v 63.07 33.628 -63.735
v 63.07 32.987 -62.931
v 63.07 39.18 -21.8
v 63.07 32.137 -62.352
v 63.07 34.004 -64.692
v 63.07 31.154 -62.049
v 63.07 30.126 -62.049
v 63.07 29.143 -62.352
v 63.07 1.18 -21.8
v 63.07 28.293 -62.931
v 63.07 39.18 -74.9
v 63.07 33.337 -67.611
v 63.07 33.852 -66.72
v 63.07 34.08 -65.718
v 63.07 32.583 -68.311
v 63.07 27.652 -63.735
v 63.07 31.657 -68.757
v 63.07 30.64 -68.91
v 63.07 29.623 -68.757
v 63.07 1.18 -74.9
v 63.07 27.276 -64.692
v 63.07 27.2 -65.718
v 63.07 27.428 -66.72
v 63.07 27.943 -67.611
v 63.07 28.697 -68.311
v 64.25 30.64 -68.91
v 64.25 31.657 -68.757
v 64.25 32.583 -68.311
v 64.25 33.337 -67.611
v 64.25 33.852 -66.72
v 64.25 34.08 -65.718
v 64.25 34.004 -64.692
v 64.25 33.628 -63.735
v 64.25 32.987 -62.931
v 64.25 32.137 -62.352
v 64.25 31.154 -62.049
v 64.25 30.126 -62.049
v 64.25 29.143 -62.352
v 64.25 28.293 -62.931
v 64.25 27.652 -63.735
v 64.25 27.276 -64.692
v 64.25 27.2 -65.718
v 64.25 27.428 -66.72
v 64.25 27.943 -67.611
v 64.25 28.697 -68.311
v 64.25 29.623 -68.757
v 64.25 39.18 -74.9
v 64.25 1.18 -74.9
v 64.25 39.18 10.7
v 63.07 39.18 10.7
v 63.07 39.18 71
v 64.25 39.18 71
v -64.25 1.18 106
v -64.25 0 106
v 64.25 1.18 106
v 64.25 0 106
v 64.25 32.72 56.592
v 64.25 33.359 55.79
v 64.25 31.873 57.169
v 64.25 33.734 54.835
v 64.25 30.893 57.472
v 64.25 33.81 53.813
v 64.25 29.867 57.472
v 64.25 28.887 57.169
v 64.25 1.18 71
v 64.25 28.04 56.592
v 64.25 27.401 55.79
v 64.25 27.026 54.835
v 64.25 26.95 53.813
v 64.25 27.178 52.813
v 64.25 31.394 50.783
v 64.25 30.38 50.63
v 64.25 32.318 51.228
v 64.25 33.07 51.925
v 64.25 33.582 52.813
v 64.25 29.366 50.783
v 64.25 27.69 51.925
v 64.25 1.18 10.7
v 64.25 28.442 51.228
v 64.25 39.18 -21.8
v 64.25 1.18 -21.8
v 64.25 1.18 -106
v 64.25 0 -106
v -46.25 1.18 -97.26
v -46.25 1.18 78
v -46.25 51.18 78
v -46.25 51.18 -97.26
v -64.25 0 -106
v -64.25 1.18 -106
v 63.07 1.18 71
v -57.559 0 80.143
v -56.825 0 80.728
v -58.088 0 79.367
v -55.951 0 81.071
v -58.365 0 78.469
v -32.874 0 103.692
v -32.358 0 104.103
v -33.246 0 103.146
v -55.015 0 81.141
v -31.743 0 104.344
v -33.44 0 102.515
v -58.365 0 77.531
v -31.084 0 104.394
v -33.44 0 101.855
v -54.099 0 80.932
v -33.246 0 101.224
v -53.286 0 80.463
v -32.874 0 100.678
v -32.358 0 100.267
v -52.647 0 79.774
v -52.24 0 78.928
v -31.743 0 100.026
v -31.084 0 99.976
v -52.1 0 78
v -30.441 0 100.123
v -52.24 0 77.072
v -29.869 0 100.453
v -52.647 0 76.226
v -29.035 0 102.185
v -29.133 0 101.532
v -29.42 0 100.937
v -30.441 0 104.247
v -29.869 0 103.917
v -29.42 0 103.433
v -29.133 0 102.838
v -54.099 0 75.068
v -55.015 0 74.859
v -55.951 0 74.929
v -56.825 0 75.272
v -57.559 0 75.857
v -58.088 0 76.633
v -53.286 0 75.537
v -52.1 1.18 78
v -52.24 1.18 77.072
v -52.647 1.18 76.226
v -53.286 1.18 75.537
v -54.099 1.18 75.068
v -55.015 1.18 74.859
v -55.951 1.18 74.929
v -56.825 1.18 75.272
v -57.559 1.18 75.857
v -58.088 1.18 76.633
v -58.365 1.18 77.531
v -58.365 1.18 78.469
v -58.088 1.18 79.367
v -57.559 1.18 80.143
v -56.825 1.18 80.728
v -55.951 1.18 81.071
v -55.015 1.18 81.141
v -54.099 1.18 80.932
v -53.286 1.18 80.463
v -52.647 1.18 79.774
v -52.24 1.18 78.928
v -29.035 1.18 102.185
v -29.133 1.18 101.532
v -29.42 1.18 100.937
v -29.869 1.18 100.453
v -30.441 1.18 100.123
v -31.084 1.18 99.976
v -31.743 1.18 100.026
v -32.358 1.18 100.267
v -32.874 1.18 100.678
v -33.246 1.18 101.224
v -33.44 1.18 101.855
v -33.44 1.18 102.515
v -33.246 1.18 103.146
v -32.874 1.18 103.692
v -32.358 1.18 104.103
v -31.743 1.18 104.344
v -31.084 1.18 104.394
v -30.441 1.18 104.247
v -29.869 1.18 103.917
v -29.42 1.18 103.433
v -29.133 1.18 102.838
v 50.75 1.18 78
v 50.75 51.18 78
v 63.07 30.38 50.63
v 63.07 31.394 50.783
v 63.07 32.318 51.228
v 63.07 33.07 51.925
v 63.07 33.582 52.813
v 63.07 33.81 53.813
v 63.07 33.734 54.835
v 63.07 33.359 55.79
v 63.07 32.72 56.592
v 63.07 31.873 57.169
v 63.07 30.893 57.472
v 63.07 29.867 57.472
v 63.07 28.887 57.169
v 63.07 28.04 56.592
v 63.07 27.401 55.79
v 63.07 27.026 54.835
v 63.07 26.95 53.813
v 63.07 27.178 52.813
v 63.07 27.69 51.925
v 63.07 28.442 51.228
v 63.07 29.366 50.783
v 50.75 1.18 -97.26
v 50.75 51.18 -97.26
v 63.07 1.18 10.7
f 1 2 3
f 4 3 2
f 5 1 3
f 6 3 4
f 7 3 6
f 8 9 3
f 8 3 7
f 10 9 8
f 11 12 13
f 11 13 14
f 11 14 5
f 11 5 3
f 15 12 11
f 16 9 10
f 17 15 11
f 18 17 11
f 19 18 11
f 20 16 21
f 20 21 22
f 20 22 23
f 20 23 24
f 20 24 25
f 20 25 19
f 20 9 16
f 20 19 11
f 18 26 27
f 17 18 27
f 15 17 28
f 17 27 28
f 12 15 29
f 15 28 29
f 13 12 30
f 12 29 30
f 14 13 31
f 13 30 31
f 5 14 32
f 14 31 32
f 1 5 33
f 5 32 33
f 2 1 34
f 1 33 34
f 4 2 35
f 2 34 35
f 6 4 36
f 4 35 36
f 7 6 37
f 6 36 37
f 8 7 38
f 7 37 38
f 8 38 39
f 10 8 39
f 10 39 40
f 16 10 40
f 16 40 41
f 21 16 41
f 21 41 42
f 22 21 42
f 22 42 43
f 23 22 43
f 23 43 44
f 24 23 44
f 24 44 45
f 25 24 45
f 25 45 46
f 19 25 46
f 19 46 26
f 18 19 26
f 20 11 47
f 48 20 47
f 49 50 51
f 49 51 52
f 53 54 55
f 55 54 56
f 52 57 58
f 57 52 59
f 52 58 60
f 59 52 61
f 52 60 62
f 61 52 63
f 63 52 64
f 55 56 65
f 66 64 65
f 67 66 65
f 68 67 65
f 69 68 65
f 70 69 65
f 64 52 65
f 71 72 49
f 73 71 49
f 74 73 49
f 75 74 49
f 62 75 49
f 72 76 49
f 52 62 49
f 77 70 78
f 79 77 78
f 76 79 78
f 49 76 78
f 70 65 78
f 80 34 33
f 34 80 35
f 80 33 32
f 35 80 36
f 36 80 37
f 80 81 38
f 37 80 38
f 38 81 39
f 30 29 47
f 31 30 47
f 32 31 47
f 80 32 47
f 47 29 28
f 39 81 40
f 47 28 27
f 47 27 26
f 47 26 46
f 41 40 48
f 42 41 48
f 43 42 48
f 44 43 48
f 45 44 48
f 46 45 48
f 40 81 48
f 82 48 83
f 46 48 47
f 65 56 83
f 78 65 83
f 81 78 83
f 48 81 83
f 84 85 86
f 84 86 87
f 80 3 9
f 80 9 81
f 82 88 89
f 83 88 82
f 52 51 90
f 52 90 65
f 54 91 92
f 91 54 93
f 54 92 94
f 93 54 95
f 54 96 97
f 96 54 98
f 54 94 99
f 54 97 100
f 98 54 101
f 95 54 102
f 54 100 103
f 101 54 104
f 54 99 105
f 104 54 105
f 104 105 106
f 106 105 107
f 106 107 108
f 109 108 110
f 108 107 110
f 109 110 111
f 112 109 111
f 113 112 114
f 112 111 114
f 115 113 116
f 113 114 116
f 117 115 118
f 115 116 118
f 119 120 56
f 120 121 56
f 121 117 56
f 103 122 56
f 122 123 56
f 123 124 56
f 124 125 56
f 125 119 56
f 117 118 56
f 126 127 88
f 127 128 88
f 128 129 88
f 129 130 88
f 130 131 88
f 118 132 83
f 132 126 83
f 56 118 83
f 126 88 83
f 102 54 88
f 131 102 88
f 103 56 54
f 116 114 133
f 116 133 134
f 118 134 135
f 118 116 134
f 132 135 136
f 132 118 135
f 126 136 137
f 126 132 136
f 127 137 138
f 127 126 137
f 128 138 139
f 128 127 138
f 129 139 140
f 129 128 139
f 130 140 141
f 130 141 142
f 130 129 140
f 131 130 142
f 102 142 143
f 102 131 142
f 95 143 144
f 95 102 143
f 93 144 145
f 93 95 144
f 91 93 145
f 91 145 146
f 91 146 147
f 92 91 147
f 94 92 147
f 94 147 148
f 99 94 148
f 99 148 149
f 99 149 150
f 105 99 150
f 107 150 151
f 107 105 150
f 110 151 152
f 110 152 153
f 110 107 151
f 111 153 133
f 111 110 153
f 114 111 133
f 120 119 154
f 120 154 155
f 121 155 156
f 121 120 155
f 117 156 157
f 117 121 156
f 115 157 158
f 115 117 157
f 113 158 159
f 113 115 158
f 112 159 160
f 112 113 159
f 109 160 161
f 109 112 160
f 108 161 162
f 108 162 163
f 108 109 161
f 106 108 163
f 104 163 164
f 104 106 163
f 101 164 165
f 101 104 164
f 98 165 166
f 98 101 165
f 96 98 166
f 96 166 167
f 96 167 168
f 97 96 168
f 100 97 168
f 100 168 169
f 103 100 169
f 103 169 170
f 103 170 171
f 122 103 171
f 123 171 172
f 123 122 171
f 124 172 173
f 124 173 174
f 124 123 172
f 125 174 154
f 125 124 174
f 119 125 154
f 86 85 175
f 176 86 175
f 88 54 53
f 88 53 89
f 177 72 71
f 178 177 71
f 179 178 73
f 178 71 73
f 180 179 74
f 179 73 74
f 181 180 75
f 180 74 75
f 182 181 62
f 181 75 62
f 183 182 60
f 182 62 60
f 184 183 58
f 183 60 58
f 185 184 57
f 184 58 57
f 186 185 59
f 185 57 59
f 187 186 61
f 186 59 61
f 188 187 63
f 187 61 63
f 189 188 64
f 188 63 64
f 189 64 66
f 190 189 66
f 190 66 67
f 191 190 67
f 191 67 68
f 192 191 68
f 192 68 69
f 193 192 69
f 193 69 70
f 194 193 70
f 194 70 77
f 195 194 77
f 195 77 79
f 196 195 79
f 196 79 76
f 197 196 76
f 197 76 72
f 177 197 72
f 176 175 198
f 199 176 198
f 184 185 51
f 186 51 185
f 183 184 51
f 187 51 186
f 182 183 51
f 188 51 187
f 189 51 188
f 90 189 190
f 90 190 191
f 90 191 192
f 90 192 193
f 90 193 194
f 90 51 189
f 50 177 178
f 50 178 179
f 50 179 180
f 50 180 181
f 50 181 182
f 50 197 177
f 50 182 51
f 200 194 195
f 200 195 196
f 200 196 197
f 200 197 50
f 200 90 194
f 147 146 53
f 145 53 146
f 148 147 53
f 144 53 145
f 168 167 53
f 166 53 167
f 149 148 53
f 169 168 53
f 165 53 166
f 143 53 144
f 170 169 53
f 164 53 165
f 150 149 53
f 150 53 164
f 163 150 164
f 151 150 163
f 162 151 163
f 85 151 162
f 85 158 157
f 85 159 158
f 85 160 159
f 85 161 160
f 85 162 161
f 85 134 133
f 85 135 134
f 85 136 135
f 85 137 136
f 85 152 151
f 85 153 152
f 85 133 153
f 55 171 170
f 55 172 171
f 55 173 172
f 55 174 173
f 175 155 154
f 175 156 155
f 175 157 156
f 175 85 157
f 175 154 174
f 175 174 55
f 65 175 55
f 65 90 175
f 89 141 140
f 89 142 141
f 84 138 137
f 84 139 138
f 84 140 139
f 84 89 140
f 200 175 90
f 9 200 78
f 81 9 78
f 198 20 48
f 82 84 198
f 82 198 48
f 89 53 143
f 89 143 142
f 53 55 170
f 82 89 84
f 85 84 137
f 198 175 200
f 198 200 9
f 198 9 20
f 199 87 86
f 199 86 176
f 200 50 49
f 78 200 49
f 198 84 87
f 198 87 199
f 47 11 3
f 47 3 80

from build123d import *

# Parameters (mm, degrees)
SKETCH1_W        = 128.5
SKETCH1_H        = 212
SKETCH1_R        = 3.15
SKETCH1_R_2      = 2.215
BASE_DEPTH       = 1.18
SKETCH4_W        = 97
SKETCH4_H        = 175.26
CAPACITORS_DEPTH = 50
SKETCH2_W        = 1.18
SKETCH2_H        = 60.3
SKETCH2_H_2      = 53.1
TABS_DEPTH       = 38
TAB_HOLES_REACH  = 130.5
SKETCH3_R        = 3.44
SKETCH3_R_2      = 3.45


with BuildPart() as part:
    # Sketch1 → Base (new body)
    with BuildSketch(Plane(origin=(0, 0, 0), x_dir=(1, 0, 0), z_dir=(0, 1, 0))):
        Rectangle(SKETCH1_W, SKETCH1_H)
        with Locations((-55.25, -78)):
            Circle(SKETCH1_R, mode=Mode.SUBTRACT)
        with Locations((-31.25, -102.185)):
            Circle(SKETCH1_R_2, mode=Mode.SUBTRACT)
    extrude(amount=BASE_DEPTH)

    # Sketch4 → Capacitors (add)
    with BuildSketch(Plane(origin=(0, 1.18, 0), x_dir=(1, 0, 0), z_dir=(0, 1, 0))):
        with Locations((2.25, 9.63)):
            Rectangle(SKETCH4_W, SKETCH4_H)
    extrude(amount=CAPACITORS_DEPTH)

    # Sketch2 → Tabs (add)
    with BuildSketch(Plane(origin=(0, 1.18, 0), x_dir=(1, 0, 0), z_dir=(0, 1, 0))):
        with Locations((63.66, -40.85)):
            Rectangle(SKETCH2_W, SKETCH2_H)
        with Locations((63.66, 48.35)):
            Rectangle(SKETCH2_W, SKETCH2_H_2)
    extrude(amount=TABS_DEPTH)

    # Sketch3 → Tab Holes (cut, up to next)
    with BuildSketch(Plane(origin=(64.25, 0, 0), x_dir=(0, 0, -1), z_dir=(1, 0, 0)), mode=Mode.PRIVATE) as tab_holes_sk1:
        with Locations((-54.07, 30.38)):
            Circle(SKETCH3_R)
    tab_holes_tool1 = extrude(tab_holes_sk1.sketch, amount=-TAB_HOLES_REACH, mode=Mode.PRIVATE) & part.part
    add(tab_holes_tool1.solids().sort_by_distance((64.25, 30.38, 54.07))[0], mode=Mode.SUBTRACT)
    # Sketch3 → Tab Holes (cut, up to next)
    with BuildSketch(Plane(origin=(64.25, 0, 0), x_dir=(0, 0, -1), z_dir=(1, 0, 0)), mode=Mode.PRIVATE) as tab_holes_sk2:
        with Locations((65.46, 30.64)):
            Circle(SKETCH3_R_2)
    tab_holes_tool2 = extrude(tab_holes_sk2.sketch, amount=-TAB_HOLES_REACH, mode=Mode.PRIVATE) & part.part
    add(tab_holes_tool2.solids().sort_by_distance((64.25, 30.64, -65.46))[0], mode=Mode.SUBTRACT)


solid = part.part
